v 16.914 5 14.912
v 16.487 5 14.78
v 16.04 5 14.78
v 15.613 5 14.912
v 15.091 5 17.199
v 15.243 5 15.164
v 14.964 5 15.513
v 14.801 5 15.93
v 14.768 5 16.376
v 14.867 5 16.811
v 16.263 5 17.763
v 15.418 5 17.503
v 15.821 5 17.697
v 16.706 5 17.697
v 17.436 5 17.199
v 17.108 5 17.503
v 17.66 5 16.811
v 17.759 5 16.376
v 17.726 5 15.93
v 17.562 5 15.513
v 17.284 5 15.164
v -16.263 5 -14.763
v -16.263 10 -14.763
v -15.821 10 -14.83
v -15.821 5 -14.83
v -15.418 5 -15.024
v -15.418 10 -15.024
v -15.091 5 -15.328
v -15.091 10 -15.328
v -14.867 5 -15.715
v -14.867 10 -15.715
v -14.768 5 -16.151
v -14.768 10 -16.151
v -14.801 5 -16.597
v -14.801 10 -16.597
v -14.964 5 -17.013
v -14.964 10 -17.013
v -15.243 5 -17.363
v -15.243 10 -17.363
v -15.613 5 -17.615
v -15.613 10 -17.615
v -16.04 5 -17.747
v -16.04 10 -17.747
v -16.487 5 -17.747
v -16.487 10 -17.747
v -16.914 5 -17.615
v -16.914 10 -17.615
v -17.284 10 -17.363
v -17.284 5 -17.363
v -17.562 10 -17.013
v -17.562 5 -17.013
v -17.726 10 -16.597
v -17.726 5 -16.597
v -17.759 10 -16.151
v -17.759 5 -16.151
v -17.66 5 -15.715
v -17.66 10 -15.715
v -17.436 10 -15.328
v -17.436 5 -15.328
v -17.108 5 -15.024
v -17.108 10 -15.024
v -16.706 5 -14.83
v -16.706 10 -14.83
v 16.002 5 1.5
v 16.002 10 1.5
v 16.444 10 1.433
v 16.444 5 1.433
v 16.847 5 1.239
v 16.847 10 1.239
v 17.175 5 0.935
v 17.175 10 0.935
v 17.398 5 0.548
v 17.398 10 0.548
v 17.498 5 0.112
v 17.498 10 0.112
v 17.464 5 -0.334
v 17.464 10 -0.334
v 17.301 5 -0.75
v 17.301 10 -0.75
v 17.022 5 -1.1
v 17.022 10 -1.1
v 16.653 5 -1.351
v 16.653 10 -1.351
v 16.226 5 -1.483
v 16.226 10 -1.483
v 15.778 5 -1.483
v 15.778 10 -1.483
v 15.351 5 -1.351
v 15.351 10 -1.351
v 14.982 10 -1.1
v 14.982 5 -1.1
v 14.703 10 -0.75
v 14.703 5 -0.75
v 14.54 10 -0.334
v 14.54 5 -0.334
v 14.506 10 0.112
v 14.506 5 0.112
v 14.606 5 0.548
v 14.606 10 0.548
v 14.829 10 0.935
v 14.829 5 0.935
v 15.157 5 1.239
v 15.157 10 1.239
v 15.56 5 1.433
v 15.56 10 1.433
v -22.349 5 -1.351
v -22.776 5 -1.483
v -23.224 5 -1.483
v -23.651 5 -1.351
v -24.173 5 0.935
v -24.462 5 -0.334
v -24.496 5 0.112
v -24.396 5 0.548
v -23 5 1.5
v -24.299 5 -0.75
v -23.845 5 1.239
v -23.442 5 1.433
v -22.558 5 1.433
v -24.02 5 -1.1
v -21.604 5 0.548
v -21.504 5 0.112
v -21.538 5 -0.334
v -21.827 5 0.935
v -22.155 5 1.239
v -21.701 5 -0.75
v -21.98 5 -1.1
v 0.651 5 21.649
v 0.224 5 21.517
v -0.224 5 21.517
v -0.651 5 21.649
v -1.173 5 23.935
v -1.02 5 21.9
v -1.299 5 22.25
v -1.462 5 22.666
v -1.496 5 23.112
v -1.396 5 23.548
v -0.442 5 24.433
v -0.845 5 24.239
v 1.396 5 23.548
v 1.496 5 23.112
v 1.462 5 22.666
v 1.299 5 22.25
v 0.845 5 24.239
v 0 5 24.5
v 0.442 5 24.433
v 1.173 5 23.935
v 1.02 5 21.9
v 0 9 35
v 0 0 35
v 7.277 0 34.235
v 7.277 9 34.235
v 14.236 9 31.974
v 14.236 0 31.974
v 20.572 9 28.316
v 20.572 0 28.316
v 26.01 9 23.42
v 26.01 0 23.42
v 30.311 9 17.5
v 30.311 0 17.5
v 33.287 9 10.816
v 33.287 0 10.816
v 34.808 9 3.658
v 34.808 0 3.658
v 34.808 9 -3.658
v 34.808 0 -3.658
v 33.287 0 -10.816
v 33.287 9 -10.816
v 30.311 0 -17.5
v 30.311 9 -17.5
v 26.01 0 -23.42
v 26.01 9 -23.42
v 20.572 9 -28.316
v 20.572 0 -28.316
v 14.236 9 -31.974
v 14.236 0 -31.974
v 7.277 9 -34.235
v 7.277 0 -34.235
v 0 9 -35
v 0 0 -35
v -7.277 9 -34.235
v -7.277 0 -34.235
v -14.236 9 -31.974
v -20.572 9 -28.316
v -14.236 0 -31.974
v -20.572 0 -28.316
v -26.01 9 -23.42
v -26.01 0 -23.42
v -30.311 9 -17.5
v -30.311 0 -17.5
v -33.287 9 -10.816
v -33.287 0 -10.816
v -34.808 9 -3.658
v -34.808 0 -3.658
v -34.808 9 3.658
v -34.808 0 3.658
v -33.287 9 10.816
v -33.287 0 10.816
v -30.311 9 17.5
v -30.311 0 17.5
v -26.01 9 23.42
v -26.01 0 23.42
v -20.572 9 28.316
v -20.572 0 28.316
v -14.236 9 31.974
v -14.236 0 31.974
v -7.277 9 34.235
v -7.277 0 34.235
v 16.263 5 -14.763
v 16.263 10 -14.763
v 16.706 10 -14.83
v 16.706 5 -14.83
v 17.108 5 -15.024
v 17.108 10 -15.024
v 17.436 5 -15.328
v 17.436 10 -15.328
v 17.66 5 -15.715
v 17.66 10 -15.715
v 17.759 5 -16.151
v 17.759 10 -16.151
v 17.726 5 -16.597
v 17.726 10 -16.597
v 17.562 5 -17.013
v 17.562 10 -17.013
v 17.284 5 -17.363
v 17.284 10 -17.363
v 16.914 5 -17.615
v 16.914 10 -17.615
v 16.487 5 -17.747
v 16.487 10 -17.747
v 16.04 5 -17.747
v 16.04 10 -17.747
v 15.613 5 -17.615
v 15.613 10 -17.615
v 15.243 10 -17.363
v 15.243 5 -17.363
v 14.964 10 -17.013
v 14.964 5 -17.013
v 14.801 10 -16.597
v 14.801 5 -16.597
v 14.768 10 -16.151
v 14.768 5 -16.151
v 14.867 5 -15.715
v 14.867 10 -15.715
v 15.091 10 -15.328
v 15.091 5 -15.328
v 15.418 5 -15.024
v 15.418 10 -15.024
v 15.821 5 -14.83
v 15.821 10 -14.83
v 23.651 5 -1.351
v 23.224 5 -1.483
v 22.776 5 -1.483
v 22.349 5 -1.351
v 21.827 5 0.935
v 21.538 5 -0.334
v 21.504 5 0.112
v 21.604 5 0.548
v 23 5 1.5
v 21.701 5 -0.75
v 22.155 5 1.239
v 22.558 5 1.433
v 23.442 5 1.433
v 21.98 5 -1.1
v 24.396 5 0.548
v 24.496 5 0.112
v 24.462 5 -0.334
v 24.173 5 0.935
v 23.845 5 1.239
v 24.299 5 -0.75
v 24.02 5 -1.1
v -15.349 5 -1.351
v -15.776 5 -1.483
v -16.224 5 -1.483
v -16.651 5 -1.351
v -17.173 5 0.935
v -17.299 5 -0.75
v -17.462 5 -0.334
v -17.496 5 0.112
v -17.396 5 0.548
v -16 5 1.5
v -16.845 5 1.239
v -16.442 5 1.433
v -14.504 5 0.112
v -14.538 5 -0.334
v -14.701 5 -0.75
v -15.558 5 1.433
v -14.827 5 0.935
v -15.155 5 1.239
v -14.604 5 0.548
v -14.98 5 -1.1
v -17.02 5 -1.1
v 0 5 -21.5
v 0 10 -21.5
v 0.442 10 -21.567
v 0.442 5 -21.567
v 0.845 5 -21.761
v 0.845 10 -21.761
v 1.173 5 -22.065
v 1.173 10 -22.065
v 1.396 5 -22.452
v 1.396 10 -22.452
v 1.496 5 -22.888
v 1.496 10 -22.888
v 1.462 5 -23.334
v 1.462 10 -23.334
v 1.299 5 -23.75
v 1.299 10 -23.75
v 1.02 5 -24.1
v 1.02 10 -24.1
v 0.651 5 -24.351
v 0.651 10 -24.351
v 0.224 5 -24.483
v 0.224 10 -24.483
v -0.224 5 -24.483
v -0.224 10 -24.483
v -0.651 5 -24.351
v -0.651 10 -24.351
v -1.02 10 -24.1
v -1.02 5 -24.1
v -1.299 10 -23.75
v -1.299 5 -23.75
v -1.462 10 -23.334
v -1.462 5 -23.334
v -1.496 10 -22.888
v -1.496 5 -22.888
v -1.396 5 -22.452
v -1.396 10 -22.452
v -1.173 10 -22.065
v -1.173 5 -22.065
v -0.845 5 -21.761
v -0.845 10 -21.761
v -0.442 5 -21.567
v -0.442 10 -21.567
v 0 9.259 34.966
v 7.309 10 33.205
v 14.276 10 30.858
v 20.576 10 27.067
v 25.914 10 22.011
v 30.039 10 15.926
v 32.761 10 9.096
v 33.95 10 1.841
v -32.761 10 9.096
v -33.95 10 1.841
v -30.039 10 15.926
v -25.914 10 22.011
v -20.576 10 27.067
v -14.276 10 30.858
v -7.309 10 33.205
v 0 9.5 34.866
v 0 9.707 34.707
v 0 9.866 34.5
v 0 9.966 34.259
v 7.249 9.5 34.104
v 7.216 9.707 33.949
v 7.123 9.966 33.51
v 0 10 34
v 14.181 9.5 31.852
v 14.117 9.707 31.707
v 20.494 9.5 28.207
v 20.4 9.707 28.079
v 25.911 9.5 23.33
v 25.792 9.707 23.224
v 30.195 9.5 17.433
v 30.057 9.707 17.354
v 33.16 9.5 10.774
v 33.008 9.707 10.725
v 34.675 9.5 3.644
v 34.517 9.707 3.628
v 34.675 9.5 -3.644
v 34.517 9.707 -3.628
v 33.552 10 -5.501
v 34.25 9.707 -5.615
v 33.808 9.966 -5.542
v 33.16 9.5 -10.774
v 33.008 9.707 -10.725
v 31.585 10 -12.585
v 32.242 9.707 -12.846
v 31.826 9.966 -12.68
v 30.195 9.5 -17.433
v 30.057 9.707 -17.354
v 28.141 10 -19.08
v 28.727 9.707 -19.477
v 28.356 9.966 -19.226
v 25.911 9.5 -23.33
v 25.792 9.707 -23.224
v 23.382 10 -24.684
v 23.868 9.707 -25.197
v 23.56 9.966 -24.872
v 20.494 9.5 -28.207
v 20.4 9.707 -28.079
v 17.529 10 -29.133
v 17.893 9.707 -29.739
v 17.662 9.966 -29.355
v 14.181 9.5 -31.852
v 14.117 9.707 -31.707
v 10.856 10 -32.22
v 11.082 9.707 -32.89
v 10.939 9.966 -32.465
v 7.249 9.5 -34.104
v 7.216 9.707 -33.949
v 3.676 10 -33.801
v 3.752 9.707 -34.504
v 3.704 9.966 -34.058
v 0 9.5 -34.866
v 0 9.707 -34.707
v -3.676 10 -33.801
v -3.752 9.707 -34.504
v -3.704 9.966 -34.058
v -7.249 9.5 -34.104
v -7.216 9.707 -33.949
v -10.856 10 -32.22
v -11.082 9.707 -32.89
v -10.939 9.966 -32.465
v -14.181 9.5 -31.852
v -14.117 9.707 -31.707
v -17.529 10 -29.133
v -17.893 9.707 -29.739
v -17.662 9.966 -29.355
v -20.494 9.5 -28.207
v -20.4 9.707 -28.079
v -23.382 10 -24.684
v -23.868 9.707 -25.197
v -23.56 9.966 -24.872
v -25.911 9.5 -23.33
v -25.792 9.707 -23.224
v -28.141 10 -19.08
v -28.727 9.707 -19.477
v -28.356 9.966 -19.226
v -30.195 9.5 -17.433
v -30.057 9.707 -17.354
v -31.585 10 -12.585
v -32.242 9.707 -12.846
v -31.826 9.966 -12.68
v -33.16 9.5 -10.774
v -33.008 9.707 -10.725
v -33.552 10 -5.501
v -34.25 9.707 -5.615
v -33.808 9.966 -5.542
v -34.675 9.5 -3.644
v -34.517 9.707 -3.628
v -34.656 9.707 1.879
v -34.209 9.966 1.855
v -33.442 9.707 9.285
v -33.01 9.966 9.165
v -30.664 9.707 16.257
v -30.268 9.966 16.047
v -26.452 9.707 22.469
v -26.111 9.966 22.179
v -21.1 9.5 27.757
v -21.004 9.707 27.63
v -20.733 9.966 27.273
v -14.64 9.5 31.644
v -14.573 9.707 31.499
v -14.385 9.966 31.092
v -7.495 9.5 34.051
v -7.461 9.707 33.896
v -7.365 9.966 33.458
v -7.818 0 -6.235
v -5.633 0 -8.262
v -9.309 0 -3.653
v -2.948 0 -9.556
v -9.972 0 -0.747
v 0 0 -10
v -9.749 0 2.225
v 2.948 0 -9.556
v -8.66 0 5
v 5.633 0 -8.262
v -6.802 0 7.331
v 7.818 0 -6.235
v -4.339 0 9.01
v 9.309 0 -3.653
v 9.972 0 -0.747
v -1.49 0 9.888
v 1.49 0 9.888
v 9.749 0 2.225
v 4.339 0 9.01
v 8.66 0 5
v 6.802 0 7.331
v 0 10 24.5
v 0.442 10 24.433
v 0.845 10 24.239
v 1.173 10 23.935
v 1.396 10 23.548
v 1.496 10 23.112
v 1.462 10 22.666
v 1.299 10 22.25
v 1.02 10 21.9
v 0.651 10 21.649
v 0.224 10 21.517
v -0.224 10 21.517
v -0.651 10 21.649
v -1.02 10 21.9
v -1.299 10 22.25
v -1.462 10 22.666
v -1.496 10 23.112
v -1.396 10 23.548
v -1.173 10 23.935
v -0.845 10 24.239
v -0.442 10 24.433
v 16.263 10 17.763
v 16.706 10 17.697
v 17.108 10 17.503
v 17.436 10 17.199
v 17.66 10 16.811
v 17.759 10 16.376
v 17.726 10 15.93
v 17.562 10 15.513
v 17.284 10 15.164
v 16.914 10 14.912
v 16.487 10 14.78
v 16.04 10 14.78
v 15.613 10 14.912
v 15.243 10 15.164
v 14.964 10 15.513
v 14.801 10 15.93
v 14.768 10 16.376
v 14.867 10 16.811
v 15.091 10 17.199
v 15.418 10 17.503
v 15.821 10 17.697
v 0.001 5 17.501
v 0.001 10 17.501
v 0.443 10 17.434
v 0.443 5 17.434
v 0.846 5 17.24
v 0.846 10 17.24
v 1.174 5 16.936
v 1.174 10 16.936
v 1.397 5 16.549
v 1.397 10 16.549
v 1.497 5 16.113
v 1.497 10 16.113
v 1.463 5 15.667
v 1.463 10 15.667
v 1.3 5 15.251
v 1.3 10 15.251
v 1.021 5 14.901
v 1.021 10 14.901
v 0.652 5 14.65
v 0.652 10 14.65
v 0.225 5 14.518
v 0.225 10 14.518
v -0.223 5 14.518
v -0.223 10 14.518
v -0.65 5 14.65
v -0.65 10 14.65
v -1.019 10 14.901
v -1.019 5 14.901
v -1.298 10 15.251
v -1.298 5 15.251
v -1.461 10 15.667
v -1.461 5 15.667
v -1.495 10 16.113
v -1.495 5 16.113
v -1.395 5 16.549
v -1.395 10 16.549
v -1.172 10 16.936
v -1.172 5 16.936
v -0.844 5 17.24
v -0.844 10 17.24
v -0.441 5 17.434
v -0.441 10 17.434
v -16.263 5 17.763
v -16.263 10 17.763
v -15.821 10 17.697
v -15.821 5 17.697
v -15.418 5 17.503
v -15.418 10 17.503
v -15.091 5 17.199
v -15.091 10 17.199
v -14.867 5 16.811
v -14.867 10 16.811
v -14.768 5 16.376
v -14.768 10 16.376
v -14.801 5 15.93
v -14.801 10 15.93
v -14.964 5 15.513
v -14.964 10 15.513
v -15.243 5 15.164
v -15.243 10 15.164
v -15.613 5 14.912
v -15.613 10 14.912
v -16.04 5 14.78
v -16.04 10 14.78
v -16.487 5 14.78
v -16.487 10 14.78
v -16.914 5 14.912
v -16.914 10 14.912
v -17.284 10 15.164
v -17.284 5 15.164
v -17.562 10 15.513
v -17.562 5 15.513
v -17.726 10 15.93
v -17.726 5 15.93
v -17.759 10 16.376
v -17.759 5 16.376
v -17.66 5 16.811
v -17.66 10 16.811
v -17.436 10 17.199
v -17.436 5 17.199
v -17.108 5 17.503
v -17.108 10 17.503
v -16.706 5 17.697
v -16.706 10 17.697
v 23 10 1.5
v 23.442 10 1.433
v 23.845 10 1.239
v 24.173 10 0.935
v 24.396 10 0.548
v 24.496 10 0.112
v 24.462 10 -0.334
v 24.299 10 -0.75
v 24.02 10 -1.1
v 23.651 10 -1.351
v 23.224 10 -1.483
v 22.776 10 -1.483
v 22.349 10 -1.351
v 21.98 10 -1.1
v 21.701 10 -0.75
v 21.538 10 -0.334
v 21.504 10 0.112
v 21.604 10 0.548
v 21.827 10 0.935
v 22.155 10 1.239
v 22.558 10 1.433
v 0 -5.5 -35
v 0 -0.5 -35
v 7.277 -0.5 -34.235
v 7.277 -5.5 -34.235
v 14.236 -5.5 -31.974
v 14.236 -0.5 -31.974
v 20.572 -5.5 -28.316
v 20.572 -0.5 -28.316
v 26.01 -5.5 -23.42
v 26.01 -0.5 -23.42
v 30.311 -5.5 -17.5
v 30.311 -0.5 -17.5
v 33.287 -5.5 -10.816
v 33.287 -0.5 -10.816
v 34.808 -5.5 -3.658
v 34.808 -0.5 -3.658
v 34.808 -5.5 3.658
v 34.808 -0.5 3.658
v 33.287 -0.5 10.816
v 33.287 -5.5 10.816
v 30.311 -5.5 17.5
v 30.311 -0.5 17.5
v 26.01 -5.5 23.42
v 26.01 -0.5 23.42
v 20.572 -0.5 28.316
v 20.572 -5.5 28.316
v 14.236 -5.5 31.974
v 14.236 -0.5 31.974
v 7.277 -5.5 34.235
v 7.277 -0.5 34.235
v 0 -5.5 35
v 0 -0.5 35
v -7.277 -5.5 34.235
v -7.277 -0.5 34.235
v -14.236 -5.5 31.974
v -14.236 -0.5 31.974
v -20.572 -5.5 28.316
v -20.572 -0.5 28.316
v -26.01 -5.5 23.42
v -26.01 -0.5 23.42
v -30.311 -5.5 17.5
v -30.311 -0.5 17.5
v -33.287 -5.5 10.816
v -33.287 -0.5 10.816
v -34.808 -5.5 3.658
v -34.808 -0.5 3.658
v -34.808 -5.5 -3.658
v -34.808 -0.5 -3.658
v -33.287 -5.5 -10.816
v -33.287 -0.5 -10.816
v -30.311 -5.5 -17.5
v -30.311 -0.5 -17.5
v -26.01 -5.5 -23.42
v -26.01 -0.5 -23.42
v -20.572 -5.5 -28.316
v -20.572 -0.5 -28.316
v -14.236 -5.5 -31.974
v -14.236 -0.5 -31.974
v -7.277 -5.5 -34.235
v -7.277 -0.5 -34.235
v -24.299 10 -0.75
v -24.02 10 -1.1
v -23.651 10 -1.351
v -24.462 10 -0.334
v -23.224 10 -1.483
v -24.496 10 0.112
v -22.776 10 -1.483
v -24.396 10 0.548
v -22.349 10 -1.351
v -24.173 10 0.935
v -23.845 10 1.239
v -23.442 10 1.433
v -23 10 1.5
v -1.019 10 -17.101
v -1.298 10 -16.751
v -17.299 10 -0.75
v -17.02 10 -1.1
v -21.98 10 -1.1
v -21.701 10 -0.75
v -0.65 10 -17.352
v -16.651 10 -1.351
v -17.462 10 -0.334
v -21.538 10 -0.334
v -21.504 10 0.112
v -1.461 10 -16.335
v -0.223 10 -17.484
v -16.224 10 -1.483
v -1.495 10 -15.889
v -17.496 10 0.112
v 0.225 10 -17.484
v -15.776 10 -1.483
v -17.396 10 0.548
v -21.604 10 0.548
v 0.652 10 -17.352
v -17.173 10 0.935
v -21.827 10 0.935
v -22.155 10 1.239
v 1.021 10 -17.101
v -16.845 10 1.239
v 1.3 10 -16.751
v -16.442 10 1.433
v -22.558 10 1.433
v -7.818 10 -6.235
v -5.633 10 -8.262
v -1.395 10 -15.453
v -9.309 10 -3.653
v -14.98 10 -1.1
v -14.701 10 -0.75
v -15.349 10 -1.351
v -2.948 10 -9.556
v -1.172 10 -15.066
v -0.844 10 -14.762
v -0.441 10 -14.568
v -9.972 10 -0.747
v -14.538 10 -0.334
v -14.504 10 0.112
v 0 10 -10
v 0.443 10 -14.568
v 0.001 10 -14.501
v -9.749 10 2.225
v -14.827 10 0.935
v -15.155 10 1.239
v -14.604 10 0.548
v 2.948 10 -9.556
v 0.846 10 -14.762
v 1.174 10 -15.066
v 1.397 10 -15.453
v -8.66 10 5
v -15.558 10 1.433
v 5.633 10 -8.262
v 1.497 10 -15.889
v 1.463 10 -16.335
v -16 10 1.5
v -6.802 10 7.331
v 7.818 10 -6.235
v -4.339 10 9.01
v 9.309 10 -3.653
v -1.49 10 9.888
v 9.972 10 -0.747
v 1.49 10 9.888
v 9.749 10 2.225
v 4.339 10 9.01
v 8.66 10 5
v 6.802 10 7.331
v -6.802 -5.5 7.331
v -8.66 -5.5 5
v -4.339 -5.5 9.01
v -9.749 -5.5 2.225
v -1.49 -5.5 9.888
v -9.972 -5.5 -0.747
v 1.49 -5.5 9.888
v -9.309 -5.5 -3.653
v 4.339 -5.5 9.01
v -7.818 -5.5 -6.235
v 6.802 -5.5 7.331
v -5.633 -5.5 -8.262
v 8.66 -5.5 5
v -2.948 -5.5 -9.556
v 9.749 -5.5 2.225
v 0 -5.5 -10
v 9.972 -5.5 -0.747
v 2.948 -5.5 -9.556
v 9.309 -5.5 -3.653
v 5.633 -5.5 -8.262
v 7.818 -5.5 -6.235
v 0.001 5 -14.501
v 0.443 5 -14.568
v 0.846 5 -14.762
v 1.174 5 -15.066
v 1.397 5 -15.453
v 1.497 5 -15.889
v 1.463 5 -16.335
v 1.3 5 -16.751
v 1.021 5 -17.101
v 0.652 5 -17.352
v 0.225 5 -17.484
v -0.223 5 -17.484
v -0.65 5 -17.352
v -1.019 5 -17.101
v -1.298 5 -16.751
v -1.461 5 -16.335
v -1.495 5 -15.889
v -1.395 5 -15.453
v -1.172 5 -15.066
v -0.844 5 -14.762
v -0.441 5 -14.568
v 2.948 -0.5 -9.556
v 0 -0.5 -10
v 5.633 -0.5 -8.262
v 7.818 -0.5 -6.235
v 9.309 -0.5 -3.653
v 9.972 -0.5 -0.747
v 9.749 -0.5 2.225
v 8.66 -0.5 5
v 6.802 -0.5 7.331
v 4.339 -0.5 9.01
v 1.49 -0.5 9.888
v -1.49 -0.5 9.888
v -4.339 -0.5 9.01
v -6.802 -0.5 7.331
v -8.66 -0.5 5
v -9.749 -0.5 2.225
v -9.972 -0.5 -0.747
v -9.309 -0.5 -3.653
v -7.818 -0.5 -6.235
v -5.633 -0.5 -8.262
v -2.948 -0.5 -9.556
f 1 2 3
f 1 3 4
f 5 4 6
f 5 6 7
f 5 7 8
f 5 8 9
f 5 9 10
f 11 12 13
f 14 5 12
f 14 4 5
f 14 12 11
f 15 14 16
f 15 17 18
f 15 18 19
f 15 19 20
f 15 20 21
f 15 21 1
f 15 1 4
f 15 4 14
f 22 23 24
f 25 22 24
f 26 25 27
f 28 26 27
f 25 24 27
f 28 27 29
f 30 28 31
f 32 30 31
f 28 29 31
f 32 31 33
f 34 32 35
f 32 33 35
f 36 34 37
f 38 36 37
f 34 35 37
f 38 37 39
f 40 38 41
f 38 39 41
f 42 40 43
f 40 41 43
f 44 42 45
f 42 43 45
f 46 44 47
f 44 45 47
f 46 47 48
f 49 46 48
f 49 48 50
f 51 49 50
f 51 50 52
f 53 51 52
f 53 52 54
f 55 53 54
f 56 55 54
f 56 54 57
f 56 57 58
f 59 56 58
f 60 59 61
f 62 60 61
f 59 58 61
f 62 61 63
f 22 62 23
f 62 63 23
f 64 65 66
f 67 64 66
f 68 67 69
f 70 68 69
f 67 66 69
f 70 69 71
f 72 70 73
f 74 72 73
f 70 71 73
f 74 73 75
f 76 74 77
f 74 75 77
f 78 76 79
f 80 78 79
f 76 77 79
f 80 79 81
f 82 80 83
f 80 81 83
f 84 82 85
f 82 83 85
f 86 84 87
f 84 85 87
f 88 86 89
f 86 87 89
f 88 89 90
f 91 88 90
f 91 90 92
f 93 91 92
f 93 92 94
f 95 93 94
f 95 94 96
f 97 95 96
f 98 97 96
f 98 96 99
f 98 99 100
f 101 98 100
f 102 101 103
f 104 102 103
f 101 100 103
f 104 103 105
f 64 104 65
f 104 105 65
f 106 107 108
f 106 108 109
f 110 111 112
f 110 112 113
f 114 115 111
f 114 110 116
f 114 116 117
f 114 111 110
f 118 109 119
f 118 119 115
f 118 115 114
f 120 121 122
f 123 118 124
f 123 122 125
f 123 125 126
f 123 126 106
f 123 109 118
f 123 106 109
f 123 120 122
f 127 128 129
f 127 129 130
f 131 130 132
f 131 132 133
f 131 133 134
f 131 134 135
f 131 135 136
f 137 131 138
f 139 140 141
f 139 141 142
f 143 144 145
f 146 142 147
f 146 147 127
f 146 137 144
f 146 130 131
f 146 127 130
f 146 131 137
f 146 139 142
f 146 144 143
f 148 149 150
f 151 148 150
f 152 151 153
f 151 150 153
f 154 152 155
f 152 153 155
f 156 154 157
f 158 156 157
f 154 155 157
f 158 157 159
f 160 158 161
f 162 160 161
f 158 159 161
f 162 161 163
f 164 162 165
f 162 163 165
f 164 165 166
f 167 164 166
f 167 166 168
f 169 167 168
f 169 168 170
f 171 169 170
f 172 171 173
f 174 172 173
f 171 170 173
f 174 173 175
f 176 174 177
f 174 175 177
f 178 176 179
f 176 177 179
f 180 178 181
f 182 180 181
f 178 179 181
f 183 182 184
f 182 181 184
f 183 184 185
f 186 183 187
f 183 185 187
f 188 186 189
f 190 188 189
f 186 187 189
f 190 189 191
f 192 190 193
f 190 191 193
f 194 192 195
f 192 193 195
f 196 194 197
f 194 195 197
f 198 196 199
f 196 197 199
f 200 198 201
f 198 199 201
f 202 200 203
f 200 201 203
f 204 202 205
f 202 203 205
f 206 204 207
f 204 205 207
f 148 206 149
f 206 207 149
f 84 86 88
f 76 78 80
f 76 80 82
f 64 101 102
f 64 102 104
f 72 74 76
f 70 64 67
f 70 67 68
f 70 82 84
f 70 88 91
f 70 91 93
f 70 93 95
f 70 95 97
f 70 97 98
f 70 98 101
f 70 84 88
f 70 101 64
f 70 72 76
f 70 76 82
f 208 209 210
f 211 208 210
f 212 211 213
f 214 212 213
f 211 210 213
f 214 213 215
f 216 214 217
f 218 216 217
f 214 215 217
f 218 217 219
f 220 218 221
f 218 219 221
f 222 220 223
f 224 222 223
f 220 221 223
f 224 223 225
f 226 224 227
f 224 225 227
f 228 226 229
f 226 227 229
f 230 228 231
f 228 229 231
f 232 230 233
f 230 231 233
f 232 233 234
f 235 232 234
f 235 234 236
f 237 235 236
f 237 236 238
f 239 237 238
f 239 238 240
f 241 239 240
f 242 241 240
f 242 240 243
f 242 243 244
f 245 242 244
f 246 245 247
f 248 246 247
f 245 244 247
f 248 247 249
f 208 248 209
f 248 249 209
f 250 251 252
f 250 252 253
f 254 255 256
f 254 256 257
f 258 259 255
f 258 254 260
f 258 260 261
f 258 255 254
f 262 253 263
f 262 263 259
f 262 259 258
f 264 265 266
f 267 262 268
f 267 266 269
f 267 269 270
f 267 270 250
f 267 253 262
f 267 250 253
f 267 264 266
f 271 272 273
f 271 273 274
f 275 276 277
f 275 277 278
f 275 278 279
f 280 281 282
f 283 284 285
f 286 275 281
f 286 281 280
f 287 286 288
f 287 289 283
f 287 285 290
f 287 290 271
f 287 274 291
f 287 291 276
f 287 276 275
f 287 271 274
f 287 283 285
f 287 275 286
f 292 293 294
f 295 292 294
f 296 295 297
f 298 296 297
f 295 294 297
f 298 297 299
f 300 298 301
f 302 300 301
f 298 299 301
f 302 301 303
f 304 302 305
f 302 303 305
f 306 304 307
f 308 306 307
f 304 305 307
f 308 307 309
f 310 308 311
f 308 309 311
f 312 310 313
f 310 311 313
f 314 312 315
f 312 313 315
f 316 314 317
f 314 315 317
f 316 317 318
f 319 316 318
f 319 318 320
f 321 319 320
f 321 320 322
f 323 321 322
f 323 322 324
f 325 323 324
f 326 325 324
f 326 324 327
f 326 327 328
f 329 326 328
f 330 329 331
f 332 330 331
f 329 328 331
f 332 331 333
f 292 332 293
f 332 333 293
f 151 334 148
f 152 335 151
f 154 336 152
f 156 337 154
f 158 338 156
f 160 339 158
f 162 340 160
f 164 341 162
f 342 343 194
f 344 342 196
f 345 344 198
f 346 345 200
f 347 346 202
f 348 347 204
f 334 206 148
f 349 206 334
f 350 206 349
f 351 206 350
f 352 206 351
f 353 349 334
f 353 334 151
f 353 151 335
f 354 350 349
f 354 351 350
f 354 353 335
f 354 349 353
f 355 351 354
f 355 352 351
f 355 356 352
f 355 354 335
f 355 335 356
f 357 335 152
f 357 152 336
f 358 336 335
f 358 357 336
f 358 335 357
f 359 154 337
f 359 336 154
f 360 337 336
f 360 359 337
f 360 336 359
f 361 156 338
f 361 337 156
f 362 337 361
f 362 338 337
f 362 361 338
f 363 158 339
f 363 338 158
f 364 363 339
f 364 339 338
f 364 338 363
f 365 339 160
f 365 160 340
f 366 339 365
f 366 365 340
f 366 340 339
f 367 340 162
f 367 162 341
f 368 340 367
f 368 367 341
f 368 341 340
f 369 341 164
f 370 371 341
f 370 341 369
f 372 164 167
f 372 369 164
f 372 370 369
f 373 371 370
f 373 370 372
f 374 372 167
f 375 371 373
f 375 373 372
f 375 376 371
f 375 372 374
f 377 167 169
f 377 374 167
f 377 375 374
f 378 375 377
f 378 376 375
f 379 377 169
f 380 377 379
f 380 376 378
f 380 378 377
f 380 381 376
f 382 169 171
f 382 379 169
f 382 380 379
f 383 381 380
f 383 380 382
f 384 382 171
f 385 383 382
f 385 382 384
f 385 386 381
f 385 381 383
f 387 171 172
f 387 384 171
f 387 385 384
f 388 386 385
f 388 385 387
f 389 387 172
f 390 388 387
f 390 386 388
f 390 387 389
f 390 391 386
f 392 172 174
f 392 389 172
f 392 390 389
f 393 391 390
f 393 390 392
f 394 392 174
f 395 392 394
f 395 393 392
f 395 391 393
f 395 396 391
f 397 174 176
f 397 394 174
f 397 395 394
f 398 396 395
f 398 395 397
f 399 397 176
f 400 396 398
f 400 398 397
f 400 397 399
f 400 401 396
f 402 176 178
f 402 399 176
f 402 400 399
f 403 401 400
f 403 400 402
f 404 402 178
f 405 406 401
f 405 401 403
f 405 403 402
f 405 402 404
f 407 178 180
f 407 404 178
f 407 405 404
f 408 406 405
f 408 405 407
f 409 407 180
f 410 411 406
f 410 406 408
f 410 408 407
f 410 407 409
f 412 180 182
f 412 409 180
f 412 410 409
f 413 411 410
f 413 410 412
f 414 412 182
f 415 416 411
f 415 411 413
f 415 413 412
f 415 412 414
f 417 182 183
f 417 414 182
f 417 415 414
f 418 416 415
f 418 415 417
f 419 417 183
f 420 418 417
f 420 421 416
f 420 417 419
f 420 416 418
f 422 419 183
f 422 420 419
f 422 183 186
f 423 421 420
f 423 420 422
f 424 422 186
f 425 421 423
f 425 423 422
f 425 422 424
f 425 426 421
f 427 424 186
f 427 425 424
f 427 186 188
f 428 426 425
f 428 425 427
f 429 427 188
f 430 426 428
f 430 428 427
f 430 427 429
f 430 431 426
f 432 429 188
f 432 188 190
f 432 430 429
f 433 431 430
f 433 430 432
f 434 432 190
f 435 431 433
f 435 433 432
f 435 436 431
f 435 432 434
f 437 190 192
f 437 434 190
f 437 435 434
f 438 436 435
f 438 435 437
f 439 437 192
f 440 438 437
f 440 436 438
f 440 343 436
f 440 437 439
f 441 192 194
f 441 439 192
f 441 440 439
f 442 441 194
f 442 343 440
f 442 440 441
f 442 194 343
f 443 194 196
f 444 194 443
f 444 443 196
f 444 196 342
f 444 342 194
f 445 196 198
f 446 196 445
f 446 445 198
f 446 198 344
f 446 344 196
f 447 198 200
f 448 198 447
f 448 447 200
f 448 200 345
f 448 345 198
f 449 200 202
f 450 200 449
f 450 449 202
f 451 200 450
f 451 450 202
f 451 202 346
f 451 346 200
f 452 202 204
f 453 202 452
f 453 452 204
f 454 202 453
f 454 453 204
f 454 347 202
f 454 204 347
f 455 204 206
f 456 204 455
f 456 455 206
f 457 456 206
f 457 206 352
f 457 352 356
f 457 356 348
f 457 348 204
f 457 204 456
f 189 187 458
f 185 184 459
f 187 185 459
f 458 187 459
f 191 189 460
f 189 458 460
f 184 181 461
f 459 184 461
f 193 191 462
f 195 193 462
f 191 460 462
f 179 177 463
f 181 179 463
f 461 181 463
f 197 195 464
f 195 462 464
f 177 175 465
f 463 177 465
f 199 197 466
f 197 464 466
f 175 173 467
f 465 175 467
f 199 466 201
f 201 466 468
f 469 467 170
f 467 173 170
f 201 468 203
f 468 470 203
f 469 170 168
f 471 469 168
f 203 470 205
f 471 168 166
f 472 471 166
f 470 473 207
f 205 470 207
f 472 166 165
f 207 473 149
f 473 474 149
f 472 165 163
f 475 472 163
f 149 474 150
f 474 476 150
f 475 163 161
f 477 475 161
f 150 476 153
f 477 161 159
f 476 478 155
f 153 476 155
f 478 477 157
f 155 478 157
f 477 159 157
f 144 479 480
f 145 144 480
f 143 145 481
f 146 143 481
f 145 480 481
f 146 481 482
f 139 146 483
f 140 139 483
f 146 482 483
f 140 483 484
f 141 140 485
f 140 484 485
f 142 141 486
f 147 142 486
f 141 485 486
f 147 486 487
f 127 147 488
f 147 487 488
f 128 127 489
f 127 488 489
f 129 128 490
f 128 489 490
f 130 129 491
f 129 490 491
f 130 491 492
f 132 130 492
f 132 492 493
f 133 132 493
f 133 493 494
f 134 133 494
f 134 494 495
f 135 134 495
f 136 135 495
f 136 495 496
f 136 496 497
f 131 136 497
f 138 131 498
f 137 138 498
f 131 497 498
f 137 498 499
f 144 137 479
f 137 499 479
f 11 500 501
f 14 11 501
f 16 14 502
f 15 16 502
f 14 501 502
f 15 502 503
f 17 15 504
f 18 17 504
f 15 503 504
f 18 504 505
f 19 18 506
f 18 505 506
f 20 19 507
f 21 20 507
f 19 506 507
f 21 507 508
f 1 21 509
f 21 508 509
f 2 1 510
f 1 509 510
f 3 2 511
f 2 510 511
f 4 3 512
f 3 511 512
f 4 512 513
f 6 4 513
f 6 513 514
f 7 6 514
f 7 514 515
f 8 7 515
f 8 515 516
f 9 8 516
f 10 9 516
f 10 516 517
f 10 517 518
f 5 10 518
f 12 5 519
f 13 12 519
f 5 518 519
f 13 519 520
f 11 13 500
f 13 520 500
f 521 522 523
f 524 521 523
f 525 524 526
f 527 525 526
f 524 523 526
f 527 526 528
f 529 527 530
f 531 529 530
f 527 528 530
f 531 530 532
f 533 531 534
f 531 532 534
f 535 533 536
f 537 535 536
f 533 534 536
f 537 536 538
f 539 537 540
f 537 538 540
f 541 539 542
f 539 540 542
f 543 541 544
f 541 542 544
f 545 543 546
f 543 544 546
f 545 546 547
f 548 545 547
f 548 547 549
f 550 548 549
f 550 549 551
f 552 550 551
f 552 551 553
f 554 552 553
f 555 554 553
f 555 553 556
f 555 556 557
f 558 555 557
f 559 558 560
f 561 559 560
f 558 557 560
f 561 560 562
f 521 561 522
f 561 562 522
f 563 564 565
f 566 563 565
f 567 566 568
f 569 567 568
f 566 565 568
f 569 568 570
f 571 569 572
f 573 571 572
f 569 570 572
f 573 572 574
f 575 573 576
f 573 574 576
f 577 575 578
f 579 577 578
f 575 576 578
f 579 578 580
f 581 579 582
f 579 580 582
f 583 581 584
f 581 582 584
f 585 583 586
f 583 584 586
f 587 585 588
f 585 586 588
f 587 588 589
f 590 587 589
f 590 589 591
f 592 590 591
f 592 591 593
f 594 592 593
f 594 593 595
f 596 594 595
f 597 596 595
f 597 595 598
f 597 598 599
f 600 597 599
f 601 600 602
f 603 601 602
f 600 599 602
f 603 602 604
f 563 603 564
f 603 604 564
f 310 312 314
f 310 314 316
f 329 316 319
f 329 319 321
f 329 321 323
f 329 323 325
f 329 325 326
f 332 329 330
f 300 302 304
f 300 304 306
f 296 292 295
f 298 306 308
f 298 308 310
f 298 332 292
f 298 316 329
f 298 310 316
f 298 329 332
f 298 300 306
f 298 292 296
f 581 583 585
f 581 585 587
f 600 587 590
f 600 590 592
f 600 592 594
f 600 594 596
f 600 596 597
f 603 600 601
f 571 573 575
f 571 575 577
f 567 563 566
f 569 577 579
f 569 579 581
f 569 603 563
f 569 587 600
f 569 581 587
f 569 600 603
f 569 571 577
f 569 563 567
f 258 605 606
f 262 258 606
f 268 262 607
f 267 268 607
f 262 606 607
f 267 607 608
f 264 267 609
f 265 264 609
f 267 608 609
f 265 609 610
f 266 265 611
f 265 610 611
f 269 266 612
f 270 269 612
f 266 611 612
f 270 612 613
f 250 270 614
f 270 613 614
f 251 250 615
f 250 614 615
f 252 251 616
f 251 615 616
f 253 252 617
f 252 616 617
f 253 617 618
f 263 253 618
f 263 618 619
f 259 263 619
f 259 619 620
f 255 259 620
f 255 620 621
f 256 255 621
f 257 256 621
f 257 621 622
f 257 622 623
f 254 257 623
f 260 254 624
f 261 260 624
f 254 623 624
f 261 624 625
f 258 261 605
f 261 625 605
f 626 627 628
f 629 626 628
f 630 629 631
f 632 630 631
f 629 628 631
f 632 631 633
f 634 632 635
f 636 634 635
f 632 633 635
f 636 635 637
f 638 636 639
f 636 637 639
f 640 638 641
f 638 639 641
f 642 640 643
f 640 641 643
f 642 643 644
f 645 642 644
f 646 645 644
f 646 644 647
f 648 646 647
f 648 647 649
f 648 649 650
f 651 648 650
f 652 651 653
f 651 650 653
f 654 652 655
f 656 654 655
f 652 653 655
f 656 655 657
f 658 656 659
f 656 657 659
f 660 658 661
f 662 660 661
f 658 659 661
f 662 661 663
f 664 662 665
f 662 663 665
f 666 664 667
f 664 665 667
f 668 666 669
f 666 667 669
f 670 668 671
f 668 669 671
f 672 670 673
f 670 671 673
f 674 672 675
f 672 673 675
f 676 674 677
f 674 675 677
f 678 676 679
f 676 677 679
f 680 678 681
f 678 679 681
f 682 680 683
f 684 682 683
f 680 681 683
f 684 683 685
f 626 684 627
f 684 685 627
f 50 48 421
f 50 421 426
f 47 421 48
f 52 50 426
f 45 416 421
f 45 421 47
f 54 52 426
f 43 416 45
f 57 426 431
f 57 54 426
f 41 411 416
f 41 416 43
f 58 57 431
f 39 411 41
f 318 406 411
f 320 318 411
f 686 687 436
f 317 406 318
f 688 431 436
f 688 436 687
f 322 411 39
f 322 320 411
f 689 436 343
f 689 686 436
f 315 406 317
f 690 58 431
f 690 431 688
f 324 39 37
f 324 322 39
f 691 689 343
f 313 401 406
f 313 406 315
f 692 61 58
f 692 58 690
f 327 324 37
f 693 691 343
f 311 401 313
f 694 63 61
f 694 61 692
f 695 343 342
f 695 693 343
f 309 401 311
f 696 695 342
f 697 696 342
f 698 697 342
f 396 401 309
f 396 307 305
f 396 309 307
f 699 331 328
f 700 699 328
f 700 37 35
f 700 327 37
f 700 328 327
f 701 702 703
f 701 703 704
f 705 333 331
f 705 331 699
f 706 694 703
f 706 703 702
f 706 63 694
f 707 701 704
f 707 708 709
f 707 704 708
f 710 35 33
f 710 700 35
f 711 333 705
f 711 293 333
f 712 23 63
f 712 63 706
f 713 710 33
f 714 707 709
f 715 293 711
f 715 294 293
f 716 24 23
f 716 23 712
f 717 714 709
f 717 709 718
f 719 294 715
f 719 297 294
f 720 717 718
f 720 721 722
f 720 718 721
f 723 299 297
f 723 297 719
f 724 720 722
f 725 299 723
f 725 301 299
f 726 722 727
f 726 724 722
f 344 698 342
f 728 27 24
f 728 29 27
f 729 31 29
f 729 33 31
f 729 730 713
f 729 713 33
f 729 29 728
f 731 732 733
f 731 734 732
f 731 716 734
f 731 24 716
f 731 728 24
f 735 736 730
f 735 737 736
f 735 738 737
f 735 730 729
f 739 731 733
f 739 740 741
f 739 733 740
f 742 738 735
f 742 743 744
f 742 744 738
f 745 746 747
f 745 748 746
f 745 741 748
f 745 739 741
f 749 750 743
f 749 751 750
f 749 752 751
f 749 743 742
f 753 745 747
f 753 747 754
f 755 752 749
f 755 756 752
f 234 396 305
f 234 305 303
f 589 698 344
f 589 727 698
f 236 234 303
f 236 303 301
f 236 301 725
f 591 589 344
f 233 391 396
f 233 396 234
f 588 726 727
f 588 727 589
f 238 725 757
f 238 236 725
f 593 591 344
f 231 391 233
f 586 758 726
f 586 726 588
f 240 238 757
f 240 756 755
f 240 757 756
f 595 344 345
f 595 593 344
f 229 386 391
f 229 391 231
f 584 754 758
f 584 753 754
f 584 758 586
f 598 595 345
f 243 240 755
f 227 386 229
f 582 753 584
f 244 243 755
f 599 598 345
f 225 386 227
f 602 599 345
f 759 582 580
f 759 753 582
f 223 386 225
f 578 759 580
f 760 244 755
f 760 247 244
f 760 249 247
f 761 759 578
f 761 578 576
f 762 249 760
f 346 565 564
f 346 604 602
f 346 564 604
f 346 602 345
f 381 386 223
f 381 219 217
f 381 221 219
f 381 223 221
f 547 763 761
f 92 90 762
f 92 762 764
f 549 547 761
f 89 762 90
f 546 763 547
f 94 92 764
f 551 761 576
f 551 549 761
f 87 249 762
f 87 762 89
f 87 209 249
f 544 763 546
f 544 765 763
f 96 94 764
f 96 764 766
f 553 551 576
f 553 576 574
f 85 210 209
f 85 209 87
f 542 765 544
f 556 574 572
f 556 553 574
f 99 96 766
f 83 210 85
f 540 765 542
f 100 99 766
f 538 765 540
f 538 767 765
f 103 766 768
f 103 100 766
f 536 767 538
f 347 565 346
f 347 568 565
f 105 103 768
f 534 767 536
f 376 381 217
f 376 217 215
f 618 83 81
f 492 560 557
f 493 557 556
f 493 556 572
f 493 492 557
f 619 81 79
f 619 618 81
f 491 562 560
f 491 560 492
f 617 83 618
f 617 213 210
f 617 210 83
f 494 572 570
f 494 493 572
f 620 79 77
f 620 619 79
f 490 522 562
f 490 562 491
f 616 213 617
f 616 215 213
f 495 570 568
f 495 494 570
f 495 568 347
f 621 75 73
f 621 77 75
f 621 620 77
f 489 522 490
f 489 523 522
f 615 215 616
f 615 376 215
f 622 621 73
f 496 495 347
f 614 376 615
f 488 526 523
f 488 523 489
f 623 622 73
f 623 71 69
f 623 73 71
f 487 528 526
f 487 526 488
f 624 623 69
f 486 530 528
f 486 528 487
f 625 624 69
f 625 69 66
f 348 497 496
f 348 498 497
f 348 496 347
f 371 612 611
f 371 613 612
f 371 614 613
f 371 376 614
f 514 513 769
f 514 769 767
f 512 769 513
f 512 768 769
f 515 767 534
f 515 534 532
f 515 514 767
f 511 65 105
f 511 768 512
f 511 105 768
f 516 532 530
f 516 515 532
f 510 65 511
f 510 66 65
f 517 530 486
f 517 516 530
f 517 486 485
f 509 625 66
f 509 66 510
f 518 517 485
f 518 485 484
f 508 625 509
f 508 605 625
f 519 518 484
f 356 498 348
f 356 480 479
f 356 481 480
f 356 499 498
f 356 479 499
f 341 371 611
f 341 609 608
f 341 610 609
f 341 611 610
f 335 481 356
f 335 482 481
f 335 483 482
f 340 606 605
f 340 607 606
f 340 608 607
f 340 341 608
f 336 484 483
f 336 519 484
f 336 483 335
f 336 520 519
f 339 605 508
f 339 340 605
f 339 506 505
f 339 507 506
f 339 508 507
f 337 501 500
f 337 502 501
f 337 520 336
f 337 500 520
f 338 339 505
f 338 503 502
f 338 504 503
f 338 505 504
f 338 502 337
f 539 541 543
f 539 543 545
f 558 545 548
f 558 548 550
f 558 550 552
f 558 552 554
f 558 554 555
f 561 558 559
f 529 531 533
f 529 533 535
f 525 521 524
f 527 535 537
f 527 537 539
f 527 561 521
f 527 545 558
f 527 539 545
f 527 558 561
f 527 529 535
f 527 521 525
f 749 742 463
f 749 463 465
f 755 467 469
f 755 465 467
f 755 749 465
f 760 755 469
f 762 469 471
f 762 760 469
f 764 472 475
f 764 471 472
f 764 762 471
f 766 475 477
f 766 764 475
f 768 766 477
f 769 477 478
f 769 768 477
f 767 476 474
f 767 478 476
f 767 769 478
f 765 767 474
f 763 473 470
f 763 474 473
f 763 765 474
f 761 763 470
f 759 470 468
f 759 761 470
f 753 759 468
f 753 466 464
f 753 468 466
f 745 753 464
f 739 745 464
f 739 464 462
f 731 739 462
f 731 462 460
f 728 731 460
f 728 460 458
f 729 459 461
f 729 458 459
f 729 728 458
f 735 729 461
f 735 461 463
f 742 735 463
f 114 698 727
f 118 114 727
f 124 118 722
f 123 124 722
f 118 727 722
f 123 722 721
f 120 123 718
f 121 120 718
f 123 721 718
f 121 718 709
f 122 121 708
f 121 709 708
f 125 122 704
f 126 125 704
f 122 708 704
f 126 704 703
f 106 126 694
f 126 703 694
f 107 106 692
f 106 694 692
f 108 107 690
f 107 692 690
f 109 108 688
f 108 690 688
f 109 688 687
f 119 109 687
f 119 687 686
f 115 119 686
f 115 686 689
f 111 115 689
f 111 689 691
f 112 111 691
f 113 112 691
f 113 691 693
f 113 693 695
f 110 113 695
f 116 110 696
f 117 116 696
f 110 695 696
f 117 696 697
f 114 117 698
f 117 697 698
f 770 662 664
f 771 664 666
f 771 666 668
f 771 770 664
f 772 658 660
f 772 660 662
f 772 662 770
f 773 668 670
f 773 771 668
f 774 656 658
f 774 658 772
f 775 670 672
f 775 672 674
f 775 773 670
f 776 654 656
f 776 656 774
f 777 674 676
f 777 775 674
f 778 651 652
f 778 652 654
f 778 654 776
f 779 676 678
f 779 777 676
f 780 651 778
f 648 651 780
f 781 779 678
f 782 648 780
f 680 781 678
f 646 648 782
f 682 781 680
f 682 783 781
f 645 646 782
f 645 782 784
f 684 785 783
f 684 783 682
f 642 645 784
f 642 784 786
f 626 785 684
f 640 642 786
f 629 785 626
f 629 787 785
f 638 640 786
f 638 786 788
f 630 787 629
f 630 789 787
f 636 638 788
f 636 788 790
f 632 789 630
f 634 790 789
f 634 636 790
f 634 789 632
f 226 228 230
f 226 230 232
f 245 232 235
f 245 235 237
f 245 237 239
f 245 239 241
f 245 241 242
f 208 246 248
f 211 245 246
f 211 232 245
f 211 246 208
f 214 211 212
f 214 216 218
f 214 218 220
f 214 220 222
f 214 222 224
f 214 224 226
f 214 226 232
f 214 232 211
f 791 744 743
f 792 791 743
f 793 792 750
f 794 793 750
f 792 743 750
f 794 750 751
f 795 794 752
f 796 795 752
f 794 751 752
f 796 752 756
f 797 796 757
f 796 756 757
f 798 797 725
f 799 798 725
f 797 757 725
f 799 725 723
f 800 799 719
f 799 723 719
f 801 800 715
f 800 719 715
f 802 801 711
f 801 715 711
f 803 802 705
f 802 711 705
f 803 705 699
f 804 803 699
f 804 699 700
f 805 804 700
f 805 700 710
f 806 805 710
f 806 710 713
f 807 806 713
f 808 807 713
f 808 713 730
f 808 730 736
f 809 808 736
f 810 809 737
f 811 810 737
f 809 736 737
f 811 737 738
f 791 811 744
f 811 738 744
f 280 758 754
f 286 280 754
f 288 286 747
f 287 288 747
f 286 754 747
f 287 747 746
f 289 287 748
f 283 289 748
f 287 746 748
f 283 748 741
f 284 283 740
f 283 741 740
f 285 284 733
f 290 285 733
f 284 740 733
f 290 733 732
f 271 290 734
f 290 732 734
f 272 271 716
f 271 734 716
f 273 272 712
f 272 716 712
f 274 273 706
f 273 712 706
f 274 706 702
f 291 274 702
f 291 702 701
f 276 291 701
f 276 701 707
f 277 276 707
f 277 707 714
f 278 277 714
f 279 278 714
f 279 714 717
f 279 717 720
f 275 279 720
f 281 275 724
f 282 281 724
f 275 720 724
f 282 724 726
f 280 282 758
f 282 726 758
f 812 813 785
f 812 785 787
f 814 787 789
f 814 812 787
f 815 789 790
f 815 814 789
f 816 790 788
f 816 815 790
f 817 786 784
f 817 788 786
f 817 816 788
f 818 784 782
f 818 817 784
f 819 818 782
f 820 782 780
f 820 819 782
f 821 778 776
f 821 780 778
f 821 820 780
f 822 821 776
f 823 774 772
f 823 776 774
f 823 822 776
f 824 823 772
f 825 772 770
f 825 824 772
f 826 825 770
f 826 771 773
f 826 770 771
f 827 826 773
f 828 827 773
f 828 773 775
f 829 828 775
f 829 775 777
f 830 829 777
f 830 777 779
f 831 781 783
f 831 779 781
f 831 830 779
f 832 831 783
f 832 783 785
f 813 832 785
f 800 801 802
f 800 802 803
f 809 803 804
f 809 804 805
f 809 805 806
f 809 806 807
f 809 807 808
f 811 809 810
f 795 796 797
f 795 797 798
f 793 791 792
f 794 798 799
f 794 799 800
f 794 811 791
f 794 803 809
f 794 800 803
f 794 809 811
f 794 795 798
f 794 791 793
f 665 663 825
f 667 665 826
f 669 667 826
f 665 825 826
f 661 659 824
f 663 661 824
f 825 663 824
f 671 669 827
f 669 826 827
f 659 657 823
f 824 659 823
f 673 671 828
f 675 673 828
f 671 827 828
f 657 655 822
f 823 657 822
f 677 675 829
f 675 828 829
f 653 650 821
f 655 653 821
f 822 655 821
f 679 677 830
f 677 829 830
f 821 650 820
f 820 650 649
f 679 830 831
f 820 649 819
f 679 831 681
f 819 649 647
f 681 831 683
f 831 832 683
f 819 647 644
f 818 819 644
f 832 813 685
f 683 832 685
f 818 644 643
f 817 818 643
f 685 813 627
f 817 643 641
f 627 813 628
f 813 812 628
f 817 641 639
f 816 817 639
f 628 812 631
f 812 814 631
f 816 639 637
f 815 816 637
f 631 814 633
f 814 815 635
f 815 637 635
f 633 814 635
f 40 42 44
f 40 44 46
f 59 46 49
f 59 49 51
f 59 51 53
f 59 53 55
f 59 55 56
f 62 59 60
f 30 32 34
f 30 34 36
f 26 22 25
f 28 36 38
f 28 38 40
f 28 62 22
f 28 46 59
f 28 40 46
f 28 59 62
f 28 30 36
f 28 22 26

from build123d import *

# Parameters (mm, degrees)
SKETCH_1_R               = 35
EXTRUDE_1_DEPTH          = 10
FILLET_1_R               = 1
SKETCH_2_R               = 35
EXTRUDE_2_DEPTH          = 5
SKETCH_3_R               = 1.5
CUT_EXTRUDE_1_DEPTH      = 5
CUT_EXTRUDE_3_DEPTH      = 51.59891317
CUT_EXTRUDE_3_DEPTH_BACK = 51.59891317
SKETCH_5_R               = 10


with BuildPart() as part:
    # 草图1 → 凸台-拉伸1 (new body)
    with BuildSketch(Plane(origin=(0, 0, 0), x_dir=(1, 0, 0), z_dir=(0, 1, 0))):
        with Locations(Location((0, 0, 0), (0, 0, 270))):
            Circle(SKETCH_1_R)
    extrude(amount=EXTRUDE_1_DEPTH)

    # 圆角1
    fillet_1_edges = [part.edges().sort_by_distance(p)[0] for p in [
        (0, 10, -35),
    ]]
    fillet(fillet_1_edges, radius=FILLET_1_R)

    # 草图3 → 切除-拉伸1 (cut)
    with BuildSketch(Plane(origin=(0, 10, 0), x_dir=(1, 0, 0), z_dir=(0, 1, 0))):
        with Locations(Location((-23, 0, 0), (0, 0, 270))):
            Circle(SKETCH_3_R)
        with Locations(Location((-16, 0, 0), (0, 0, 270))):
            Circle(SKETCH_3_R)
        with Locations(Location((0.001, 16.001, 0), (0, 0, 270))):
            Circle(SKETCH_3_R)
        with Locations(Location((16.002, 0, 0), (0, 0, 270))):
            Circle(SKETCH_3_R)
        with Locations(Location((0.001, -16.001, 0), (0, 0, 270))):
            Circle(SKETCH_3_R)
        with Locations(Location((-16.263455967, 16.263455967, 0), (0, 0, 270))):
            Circle(SKETCH_3_R)
        with Locations(Location((0, 23, 0), (0, 0, 270))):
            Circle(SKETCH_3_R)
        with Locations(Location((16.263455967, 16.263455967, 0), (0, 0, 270))):
            Circle(SKETCH_3_R)
        with Locations(Location((23, 0, 0), (0, 0, 270))):
            Circle(SKETCH_3_R)
        with Locations(Location((16.263455967, -16.263455967, 0), (0, 0, 270))):
            Circle(SKETCH_3_R)
        with Locations(Location((0, -23, 0), (0, 0, 270))):
            Circle(SKETCH_3_R)
        with Locations(Location((-16.263455967, -16.263455967, 0), (0, 0, 270))):
            Circle(SKETCH_3_R)
    extrude(amount=-CUT_EXTRUDE_1_DEPTH, mode=Mode.SUBTRACT)


with BuildPart() as body_2:
    # 草图2 → 凸台-拉伸2 (new body)
    with BuildSketch(Plane(origin=(0, -0.5, 0), x_dir=(-1, 0, 0), z_dir=(0, -1, 0))):
        with Locations(Location((0, 0, 0), (0, 0, 90))):
            Circle(SKETCH_2_R)
    extrude(amount=EXTRUDE_2_DEPTH)


with BuildPart() as cut_extrude_3_tool:
    # 草图5 → 切除-拉伸3 (new, two sides: drawn at the far end of the back side and taken through both)
    with BuildSketch(Plane(origin=(0, -0.5, 0), x_dir=(-1, 0, 0), z_dir=(0, -1, 0)).offset(-CUT_EXTRUDE_3_DEPTH_BACK)):
        with Locations(Location((0, 0, 0), (0, 0, 90))):
            Circle(SKETCH_5_R)
    extrude(amount=CUT_EXTRUDE_3_DEPTH + CUT_EXTRUDE_3_DEPTH_BACK)


with BuildPart() as part_1:
    add(part.part)

    # 切除-拉伸3: cut by cut_extrude_3_tool
    add(cut_extrude_3_tool.part, mode=Mode.SUBTRACT)


with BuildPart() as body_2_1:
    add(body_2.part)

    # 切除-拉伸3: cut by cut_extrude_3_tool
    add(cut_extrude_3_tool.part, mode=Mode.SUBTRACT)


solid = Compound([part_1.part, body_2_1.part])
